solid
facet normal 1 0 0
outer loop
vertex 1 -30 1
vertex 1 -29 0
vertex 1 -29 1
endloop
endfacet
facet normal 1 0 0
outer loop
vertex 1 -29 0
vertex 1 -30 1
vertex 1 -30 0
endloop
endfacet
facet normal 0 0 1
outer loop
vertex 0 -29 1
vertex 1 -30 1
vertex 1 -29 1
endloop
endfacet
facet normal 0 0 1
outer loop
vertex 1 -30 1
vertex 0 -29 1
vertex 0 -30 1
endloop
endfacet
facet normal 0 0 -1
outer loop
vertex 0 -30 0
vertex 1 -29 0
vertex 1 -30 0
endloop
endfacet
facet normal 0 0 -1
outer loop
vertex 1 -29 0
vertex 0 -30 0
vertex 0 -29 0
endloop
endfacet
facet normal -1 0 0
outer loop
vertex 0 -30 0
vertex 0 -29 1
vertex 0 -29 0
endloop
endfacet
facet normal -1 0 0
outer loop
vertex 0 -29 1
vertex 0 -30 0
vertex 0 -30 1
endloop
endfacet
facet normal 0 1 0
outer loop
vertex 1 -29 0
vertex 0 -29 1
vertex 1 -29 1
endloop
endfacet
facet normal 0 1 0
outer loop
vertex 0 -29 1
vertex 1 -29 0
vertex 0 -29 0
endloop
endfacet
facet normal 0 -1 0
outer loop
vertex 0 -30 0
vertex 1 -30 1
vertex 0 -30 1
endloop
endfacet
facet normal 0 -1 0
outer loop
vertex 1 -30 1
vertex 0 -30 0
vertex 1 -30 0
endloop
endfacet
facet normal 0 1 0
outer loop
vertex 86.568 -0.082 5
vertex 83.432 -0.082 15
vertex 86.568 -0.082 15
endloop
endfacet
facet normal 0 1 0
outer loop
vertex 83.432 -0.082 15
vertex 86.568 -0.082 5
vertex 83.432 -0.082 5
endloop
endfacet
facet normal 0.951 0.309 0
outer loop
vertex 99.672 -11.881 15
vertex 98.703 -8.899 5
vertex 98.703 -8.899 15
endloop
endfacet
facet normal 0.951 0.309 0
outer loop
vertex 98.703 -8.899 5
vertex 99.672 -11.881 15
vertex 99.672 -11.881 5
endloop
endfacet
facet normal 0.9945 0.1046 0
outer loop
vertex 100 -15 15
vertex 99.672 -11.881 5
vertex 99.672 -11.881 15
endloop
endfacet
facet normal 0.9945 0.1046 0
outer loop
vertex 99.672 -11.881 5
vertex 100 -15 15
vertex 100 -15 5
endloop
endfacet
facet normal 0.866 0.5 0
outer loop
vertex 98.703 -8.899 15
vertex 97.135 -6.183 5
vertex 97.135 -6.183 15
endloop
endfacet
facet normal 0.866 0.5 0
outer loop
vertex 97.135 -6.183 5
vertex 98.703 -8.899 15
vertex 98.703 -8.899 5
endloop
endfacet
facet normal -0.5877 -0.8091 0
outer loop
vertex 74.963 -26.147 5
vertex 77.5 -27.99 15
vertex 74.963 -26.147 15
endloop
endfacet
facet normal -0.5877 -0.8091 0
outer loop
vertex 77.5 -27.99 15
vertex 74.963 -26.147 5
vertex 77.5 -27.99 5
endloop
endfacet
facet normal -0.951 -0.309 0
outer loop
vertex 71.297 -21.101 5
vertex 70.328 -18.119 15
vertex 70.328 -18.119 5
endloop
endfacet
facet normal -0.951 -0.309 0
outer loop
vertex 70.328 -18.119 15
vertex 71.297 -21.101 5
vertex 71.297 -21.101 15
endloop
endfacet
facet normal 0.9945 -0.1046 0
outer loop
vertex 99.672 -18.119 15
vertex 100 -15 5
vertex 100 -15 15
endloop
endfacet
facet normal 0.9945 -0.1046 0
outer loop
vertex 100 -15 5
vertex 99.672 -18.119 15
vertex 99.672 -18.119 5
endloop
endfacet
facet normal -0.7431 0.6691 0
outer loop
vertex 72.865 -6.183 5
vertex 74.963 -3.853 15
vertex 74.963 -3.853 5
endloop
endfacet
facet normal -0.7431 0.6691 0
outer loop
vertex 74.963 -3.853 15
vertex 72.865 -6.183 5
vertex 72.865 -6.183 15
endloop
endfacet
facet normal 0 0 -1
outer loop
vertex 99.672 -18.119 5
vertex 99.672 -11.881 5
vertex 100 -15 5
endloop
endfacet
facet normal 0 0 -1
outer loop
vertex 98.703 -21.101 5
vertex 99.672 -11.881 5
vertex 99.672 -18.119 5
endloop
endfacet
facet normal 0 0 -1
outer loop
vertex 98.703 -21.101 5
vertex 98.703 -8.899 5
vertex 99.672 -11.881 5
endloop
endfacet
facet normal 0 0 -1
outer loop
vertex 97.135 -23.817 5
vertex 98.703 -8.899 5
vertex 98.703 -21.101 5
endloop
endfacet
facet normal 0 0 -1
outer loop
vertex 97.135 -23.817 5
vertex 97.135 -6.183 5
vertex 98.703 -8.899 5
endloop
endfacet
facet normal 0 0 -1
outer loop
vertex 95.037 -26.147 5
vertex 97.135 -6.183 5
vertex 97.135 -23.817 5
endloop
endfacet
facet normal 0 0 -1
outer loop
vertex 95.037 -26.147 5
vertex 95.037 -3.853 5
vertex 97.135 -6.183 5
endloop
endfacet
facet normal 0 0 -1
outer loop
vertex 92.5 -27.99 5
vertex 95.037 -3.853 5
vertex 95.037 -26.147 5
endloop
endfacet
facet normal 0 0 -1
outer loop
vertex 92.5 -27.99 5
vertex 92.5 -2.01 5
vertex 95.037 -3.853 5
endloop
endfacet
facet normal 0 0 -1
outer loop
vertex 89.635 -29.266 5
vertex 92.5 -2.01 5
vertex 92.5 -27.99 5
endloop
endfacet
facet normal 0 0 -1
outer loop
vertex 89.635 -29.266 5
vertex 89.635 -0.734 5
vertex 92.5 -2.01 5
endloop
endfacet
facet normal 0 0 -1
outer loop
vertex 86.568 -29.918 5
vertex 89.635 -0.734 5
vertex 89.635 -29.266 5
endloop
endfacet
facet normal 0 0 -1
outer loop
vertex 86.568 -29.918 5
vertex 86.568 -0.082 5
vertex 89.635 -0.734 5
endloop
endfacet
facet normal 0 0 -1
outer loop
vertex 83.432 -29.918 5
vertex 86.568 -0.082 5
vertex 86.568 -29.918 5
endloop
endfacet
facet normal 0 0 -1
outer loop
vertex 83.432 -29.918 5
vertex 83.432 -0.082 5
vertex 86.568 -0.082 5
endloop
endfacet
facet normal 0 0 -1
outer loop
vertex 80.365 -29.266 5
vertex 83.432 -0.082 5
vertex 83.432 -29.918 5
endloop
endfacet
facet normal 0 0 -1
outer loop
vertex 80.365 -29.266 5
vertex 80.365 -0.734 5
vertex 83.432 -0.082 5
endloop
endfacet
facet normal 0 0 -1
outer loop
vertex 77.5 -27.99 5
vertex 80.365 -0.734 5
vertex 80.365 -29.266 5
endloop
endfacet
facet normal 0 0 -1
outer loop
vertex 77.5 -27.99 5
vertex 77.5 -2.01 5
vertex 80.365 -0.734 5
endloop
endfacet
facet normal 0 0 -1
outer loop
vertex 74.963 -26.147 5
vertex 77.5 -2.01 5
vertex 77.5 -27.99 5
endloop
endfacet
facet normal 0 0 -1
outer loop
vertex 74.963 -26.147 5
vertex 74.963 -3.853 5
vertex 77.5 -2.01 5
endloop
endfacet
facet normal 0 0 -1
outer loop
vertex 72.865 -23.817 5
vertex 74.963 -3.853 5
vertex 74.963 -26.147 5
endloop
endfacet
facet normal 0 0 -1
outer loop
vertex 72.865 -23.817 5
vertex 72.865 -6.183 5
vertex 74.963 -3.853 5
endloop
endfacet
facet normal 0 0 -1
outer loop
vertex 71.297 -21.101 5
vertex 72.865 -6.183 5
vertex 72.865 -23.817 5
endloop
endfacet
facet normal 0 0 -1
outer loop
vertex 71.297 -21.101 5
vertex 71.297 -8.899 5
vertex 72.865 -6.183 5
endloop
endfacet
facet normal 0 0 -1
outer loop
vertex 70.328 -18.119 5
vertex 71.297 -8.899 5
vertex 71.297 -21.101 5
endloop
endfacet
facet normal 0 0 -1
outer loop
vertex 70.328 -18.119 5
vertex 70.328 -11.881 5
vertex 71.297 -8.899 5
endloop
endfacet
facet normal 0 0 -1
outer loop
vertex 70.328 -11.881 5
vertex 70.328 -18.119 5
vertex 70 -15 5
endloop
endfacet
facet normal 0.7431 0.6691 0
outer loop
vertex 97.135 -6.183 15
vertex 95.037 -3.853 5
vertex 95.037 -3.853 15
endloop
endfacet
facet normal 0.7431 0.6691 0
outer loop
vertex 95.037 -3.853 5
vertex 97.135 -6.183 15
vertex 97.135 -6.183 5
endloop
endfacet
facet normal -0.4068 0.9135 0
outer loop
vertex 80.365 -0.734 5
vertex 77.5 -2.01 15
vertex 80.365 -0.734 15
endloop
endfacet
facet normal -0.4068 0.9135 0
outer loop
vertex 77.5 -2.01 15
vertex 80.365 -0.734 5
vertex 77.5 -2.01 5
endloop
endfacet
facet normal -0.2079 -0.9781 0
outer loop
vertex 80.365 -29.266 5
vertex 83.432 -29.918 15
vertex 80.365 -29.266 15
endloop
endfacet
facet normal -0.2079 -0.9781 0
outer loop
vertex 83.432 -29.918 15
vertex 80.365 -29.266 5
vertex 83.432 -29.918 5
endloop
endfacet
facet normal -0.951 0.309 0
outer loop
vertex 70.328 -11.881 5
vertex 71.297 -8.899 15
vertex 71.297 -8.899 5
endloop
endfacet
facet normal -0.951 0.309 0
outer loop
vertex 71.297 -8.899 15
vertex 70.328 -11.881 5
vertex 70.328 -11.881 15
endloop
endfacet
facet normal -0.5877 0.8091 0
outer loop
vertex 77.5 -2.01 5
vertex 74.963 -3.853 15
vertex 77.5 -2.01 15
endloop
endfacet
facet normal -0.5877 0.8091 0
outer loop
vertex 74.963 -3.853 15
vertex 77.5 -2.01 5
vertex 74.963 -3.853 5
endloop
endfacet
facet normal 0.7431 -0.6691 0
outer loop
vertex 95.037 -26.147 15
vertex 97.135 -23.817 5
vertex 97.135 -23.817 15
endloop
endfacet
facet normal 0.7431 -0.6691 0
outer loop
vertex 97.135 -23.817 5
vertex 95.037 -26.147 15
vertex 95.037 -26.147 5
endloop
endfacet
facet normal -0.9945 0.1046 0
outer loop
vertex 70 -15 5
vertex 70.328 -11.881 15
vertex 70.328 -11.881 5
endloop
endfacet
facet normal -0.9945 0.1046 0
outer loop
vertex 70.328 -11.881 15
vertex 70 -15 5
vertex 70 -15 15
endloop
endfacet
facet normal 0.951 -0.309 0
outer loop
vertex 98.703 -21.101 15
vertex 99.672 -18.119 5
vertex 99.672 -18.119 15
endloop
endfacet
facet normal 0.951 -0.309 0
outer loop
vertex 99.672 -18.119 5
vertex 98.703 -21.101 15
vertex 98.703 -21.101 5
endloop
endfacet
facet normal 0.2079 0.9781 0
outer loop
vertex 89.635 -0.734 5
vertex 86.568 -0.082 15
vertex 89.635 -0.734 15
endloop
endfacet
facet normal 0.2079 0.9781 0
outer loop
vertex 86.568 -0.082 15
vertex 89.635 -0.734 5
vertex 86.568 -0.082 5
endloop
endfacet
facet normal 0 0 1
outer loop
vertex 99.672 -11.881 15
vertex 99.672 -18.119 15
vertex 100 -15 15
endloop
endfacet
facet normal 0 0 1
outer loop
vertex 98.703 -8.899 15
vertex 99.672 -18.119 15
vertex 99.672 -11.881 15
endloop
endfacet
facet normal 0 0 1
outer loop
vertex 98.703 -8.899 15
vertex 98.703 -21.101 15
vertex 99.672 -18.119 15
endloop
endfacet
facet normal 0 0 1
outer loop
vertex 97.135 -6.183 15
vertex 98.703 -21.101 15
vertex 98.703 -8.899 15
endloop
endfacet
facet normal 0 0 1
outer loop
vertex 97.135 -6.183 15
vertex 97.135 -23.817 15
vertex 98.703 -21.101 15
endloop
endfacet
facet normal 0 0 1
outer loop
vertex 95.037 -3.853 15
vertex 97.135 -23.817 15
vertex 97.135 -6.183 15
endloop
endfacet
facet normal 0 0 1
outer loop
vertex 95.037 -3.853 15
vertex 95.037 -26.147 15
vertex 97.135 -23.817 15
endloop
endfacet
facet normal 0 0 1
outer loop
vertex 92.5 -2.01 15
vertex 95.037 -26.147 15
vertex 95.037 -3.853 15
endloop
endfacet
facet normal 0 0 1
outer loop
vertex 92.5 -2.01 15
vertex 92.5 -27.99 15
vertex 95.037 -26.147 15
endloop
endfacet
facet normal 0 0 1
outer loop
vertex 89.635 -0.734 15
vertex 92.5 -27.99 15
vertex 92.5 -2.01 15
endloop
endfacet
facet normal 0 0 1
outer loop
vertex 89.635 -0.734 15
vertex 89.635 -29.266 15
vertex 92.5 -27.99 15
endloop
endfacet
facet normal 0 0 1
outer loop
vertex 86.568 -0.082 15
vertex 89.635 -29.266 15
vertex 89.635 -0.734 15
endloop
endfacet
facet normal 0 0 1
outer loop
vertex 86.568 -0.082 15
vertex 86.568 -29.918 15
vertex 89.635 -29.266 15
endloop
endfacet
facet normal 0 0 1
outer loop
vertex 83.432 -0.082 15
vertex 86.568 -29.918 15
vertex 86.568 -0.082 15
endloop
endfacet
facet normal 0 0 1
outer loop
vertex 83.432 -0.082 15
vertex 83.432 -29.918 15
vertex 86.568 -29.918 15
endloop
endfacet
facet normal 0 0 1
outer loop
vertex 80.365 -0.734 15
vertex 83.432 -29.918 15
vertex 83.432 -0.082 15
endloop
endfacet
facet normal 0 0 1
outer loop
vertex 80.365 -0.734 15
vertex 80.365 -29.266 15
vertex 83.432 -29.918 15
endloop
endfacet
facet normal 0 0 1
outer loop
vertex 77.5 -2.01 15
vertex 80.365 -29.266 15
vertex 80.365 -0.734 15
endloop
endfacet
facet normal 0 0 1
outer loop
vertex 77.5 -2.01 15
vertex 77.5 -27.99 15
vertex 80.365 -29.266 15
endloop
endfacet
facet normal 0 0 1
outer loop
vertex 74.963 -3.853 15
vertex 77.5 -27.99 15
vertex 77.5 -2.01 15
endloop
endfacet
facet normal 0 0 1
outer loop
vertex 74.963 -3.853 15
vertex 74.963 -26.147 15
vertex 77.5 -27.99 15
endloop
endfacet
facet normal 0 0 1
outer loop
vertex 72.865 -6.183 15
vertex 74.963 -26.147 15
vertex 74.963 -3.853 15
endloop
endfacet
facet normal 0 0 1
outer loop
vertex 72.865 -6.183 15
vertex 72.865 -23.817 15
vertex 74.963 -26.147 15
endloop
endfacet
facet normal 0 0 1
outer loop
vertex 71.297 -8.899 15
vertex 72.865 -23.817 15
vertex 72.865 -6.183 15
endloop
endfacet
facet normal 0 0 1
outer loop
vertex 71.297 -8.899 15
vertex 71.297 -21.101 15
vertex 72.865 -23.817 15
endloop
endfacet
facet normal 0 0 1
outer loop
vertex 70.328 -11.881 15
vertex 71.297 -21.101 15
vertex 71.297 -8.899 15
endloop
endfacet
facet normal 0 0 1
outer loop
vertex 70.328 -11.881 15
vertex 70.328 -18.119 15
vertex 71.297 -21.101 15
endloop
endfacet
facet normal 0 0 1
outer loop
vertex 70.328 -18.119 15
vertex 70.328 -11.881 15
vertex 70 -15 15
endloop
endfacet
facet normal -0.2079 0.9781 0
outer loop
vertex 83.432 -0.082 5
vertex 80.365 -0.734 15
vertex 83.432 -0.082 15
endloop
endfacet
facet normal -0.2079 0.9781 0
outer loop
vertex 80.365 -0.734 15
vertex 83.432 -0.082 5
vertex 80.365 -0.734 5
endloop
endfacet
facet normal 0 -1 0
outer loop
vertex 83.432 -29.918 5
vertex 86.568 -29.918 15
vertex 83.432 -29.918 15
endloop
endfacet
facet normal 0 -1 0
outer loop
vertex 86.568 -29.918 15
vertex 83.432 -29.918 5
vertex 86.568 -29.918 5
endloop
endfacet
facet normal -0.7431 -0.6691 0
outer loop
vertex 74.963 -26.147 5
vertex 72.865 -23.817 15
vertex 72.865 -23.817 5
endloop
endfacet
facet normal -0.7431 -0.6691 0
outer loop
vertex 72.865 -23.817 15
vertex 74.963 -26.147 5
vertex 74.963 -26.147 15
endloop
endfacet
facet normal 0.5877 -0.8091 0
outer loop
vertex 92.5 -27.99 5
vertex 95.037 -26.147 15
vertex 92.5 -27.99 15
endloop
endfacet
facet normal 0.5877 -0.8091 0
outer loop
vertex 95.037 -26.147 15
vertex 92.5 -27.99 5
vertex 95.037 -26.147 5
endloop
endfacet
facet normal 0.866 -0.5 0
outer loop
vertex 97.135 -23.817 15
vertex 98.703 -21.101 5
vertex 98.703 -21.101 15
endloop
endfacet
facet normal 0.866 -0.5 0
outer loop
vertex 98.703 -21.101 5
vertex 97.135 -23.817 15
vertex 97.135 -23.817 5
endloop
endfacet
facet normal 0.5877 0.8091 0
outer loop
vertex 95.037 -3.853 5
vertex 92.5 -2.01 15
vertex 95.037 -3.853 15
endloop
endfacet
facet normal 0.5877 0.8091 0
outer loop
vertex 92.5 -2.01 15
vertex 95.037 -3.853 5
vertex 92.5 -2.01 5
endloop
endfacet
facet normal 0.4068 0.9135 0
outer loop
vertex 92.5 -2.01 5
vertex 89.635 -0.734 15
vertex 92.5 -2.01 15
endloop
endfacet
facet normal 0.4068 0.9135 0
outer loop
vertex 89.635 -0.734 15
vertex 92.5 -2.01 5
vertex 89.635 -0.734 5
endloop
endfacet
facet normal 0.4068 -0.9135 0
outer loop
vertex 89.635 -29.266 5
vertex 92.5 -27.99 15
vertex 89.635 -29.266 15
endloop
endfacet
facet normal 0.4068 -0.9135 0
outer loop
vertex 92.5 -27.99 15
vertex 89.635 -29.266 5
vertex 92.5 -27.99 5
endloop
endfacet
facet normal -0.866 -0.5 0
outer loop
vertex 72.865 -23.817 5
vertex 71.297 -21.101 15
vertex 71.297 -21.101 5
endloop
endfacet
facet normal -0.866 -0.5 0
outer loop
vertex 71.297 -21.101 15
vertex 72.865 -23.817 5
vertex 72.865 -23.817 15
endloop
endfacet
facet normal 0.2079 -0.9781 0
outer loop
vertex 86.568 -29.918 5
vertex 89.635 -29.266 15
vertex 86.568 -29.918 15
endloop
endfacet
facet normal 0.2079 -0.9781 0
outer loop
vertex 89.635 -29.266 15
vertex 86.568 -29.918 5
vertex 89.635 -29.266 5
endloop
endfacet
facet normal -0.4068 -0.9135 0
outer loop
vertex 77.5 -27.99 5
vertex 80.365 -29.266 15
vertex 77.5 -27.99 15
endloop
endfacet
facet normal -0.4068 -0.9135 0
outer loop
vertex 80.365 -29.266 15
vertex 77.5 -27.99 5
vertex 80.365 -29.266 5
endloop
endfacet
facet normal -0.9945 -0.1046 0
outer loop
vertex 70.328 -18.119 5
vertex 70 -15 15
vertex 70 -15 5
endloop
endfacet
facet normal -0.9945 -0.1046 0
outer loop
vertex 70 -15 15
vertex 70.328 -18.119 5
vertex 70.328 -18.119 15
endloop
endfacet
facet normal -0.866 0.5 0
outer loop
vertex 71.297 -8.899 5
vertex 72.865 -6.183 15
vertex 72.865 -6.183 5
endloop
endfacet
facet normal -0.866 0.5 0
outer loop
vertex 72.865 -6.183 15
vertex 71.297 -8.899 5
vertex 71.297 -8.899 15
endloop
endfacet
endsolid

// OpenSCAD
resolution=60;          // $fn

translate([0,-30,0])
difference(){
%	cube([100,30,20]);
	union(){

//		sphere(r=1, $fn=resolution);
		cube([1,1,1]);

		translate([100-30/2,30/2,20/4])
			cylinder(r=30/2,h=10);


	}  // End union
}	// Dne difference
